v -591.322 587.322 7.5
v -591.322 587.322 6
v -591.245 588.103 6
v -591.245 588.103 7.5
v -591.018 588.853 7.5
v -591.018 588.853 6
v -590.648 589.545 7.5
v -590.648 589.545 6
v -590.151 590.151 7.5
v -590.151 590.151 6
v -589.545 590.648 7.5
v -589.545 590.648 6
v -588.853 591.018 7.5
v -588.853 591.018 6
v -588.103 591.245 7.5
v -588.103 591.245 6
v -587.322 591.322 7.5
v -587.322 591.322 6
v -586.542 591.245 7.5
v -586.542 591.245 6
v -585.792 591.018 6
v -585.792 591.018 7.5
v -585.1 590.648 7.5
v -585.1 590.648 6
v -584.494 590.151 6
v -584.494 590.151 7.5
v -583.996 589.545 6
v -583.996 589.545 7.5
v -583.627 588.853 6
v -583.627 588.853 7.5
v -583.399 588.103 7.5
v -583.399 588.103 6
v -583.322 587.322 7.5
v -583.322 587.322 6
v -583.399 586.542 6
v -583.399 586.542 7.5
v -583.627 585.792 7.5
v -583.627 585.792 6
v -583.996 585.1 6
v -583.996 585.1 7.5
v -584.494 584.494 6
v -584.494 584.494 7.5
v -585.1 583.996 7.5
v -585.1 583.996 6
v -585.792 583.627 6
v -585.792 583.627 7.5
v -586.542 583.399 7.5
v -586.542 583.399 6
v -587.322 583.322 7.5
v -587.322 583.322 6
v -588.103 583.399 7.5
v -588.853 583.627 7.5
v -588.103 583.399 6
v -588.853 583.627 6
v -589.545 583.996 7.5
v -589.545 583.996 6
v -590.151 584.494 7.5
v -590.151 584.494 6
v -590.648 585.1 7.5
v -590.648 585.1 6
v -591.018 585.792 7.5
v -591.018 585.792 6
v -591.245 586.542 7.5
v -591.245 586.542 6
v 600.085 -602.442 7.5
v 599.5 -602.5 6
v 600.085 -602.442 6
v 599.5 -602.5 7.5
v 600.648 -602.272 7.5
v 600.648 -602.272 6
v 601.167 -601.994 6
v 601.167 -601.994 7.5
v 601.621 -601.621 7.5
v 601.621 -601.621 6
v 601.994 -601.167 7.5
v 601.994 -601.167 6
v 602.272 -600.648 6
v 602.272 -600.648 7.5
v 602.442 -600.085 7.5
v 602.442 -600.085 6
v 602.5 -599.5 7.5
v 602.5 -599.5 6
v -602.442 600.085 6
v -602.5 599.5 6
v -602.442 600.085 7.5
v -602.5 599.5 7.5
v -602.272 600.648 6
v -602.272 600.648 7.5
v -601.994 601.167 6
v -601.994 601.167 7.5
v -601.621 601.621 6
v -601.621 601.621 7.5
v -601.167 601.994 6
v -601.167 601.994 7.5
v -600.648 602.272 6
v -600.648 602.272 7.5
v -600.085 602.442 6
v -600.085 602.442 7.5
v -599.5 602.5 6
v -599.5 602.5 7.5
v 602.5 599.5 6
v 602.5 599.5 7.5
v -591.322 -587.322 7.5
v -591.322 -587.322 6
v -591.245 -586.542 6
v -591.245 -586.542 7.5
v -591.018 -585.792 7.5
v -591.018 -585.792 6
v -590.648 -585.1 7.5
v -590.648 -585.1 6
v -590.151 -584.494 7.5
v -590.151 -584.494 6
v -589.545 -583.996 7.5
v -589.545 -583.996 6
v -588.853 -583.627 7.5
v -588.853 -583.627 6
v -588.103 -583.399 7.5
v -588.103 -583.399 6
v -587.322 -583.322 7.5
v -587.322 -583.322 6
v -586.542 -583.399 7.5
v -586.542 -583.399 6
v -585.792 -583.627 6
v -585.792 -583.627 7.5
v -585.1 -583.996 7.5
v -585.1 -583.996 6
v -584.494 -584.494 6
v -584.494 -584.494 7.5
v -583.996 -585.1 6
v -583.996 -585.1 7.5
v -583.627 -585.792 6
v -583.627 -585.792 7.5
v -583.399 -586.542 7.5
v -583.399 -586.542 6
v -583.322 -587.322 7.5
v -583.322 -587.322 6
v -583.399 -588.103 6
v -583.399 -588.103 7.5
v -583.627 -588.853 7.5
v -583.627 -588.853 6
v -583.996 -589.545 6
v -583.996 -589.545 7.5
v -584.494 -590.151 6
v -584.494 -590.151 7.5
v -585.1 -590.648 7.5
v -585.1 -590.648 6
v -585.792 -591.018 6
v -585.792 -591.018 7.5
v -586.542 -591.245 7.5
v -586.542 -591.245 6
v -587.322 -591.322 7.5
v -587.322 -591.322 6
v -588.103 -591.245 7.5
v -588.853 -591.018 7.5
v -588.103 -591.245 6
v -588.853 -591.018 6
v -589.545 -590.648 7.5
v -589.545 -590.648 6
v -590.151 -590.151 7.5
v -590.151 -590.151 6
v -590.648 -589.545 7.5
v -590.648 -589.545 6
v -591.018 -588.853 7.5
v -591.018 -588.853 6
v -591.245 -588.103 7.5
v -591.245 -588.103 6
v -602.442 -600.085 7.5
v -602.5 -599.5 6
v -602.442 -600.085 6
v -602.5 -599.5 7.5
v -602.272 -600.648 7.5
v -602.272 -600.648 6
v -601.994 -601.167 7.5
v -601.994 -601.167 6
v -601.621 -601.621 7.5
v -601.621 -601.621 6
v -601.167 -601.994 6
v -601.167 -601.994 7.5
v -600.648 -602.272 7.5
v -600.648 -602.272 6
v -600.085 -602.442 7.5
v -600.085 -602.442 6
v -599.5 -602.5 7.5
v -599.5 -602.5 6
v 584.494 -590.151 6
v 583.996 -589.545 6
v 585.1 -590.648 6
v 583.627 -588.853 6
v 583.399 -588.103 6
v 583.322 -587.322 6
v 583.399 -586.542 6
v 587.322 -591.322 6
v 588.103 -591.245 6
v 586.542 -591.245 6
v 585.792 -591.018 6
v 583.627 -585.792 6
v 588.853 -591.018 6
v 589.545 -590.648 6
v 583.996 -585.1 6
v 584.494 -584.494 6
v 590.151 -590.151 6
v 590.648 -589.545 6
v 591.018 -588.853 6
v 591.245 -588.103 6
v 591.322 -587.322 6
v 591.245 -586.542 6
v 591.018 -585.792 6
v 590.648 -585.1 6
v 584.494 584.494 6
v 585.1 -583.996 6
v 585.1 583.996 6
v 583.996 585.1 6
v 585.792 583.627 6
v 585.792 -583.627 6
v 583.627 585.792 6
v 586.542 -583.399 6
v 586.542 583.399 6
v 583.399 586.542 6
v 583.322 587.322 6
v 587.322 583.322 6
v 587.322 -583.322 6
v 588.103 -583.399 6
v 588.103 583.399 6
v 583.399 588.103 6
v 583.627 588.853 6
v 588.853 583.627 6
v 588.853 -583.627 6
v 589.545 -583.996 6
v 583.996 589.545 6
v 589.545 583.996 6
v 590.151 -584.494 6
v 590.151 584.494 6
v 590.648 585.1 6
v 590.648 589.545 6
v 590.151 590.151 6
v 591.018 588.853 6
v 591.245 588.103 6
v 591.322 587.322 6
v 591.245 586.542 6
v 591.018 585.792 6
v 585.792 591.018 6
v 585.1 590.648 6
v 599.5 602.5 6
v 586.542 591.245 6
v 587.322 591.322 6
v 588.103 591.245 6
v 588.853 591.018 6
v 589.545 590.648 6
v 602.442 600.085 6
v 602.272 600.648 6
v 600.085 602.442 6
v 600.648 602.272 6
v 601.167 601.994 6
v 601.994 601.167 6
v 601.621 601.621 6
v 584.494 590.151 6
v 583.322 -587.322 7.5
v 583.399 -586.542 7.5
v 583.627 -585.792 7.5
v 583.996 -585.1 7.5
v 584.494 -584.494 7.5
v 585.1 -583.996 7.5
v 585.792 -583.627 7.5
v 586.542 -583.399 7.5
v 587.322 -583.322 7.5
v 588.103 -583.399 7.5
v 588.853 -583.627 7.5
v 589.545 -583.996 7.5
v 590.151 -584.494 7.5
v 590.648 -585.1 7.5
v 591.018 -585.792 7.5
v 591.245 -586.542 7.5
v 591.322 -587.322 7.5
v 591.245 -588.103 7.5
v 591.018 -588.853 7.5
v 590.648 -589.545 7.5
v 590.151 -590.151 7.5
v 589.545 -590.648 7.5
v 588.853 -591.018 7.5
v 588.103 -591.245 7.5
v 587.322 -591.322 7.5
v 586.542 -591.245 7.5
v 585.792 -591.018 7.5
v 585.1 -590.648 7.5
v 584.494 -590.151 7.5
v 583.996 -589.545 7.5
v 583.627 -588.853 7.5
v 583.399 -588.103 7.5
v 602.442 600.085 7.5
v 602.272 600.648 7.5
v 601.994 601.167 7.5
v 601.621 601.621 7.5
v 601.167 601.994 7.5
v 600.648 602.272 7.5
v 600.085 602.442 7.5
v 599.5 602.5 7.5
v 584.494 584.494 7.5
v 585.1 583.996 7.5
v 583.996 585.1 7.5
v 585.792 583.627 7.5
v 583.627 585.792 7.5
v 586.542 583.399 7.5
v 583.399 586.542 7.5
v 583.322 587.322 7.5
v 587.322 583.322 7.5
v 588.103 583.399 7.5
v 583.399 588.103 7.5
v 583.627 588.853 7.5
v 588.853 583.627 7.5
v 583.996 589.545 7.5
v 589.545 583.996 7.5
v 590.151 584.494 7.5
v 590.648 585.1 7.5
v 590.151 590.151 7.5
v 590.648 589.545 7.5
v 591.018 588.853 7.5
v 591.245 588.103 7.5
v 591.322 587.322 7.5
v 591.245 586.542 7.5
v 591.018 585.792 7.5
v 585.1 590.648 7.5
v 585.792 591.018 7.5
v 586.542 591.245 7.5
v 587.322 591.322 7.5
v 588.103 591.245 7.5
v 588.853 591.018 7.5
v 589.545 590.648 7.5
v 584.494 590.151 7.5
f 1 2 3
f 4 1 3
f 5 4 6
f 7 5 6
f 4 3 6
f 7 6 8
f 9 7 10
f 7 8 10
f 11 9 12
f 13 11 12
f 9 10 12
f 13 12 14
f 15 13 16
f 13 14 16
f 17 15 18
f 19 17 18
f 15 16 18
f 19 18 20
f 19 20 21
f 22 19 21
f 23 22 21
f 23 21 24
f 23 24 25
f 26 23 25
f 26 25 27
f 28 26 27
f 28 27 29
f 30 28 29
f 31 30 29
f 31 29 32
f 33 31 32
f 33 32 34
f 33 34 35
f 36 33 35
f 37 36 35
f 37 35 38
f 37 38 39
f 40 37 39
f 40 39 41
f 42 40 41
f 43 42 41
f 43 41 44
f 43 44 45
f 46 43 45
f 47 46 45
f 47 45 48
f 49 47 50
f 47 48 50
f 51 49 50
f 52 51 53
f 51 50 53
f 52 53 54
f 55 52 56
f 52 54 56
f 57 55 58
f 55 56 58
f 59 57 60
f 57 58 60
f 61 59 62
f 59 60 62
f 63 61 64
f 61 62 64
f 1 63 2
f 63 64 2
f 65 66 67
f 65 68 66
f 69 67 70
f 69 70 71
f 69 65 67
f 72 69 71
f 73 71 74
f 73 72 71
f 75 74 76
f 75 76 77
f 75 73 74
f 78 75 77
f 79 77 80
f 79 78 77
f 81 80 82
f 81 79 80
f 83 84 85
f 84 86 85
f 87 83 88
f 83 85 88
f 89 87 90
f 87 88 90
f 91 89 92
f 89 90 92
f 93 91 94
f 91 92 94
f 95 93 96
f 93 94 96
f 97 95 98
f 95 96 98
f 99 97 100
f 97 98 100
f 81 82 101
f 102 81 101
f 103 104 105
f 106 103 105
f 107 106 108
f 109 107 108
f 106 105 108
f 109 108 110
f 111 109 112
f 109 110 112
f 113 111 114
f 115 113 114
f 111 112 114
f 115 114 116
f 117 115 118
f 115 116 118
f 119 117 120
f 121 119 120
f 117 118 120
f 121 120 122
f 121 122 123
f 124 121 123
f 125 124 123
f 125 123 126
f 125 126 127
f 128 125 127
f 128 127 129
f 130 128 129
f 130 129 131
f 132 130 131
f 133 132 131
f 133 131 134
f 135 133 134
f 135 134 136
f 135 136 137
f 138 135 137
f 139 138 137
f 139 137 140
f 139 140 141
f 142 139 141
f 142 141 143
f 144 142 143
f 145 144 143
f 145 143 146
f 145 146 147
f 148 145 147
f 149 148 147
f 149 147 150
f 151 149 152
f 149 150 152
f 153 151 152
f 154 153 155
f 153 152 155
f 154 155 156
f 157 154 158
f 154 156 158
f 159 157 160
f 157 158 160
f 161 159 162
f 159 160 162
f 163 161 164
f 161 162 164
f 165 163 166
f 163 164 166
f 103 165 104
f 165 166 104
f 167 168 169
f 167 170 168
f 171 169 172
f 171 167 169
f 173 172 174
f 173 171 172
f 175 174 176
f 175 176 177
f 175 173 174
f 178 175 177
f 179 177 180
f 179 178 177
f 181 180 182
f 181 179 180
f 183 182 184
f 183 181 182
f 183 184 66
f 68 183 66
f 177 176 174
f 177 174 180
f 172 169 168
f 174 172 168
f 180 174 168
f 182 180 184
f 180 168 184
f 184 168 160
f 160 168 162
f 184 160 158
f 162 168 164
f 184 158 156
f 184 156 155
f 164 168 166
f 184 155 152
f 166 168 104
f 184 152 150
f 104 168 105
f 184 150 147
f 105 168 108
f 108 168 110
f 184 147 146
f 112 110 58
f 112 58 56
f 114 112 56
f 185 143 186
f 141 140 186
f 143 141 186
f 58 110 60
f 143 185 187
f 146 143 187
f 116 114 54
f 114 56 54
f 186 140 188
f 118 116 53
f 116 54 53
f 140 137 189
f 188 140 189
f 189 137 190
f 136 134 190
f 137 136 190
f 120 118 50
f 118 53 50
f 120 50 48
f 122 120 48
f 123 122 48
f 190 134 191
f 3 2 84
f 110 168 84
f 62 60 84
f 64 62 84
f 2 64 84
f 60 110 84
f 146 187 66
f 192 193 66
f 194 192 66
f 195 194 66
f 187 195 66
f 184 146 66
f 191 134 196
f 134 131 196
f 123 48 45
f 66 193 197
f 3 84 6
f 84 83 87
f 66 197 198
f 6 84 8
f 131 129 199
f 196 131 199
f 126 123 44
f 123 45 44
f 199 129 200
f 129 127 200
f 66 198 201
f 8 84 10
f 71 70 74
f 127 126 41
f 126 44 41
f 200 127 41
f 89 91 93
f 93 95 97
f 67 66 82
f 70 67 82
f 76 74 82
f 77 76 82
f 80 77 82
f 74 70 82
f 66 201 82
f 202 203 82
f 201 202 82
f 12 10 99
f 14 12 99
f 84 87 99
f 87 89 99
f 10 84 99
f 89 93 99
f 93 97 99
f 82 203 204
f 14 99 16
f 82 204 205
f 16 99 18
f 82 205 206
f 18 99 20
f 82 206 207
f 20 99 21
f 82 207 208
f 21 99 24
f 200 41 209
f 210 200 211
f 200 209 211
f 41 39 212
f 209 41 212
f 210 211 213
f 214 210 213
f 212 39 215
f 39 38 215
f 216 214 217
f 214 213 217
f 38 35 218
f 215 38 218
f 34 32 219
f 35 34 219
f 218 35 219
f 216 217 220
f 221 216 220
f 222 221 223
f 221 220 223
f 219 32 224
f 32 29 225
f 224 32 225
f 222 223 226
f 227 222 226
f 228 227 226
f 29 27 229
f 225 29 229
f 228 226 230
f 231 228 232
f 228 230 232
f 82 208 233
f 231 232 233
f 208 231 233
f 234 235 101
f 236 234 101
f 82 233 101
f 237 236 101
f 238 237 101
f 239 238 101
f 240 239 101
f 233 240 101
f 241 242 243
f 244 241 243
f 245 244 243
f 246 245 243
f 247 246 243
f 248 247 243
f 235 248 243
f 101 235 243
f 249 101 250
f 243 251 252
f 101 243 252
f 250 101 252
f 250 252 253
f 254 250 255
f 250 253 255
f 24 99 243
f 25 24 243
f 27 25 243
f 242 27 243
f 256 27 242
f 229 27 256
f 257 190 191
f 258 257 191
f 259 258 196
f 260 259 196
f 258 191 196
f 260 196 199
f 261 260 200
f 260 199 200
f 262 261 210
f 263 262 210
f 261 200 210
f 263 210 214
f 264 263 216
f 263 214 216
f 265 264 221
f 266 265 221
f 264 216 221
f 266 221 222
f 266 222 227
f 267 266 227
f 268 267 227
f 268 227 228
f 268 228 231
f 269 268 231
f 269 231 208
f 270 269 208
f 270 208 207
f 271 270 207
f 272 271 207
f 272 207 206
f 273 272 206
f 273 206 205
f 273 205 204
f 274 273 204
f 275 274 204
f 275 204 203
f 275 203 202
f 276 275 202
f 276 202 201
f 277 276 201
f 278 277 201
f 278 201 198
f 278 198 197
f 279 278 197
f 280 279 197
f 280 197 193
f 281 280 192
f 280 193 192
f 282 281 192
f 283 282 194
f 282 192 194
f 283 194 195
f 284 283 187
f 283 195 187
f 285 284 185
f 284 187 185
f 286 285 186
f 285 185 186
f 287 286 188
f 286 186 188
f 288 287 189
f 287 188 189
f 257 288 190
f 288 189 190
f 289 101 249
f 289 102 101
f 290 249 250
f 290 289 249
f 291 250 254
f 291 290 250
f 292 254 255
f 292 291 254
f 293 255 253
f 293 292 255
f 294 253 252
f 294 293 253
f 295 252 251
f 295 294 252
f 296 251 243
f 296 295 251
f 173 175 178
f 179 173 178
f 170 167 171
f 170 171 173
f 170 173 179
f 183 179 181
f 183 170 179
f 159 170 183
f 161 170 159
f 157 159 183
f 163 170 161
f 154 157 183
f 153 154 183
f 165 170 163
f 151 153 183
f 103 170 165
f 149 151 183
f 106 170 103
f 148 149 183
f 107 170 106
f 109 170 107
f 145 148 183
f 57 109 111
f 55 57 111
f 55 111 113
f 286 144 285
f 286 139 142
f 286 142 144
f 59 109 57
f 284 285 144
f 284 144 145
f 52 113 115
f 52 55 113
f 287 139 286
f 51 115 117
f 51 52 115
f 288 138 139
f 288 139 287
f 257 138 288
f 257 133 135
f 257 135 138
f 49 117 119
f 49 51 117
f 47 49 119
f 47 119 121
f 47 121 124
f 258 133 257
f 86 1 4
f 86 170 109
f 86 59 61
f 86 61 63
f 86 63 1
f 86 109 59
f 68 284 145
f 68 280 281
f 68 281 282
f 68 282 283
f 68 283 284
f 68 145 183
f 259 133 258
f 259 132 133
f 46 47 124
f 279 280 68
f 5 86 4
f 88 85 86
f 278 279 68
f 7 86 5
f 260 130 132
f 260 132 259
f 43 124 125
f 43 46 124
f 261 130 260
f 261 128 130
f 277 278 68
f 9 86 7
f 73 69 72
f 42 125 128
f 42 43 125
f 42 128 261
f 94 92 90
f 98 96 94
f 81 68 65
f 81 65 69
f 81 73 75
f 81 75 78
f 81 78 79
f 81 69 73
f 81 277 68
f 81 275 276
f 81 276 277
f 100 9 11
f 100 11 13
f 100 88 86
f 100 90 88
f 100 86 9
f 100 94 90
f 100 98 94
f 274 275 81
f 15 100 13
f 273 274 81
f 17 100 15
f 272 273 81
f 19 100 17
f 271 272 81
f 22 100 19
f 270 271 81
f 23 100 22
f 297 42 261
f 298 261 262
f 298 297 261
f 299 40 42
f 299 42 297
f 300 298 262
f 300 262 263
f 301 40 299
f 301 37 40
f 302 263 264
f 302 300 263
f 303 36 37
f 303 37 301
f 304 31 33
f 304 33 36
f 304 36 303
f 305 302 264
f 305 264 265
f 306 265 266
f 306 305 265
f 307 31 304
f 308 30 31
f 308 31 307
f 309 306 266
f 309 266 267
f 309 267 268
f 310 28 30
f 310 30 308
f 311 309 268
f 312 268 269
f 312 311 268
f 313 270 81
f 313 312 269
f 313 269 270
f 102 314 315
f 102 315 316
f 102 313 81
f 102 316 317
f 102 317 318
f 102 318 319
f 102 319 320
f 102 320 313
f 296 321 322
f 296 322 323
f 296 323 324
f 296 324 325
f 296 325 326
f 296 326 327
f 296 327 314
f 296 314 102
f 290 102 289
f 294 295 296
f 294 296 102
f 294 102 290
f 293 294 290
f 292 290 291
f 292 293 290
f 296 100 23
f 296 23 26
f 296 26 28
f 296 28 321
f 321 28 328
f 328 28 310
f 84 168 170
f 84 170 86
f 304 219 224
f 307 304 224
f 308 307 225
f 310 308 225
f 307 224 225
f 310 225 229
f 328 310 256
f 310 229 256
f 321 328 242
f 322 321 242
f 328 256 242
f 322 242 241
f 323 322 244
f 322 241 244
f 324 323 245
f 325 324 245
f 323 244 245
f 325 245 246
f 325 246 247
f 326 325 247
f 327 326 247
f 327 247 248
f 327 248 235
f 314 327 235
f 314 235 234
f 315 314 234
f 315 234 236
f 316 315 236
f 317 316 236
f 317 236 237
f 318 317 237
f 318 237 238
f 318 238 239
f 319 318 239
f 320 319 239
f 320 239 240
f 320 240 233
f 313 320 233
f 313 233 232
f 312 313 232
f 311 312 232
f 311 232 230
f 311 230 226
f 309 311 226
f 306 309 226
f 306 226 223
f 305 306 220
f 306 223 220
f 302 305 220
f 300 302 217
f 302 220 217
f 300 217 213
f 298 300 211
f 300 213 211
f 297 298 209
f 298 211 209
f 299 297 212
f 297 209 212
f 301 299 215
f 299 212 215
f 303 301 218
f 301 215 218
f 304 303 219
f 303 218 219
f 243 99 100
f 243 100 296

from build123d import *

# Parameters (mm, degrees)
SKETCH1_W           = 1205
SKETCH1_H           = 1205
BOSS_EXTRUDE1_DEPTH = 1.5
FILLET1_R           = 3
SKETCH2_R           = 4
CUT_EXTRUDE1_DEPTH  = 2.5


with BuildPart() as part:
    # Sketch1 → Boss-Extrude1 (new body)
    with BuildSketch(Plane.XY.offset(6)):
        Rectangle(SKETCH1_W, SKETCH1_H)
    extrude(amount=BOSS_EXTRUDE1_DEPTH)

    # Fillet1
    fillet1_edges = [part.edges().sort_by_distance(p)[0] for p in [
        (602.5, -602.5, 6.75),
        (-602.5, -602.5, 6.75),
        (-602.5, 602.5, 6.75),
        (602.5, 602.5, 6.75),
    ]]
    fillet(fillet1_edges, radius=FILLET1_R)

    # Sketch2 → Cut-Extrude1 (cut, through all)
    with BuildSketch(Plane(origin=(0, 0, 6), x_dir=(-1, 0, 0), z_dir=(0, 0, -1))):
        with Locations((587.32233047, -587.32233047)):
            Circle(SKETCH2_R)
        with Locations((-587.32233047, -587.32233047)):
            Circle(SKETCH2_R)
        with Locations((-587.32233047, 587.32233047)):
            Circle(SKETCH2_R)
        with Locations((587.32233047, 587.32233047)):
            Circle(SKETCH2_R)
    extrude(amount=-CUT_EXTRUDE1_DEPTH, mode=Mode.SUBTRACT)


solid = part.part
